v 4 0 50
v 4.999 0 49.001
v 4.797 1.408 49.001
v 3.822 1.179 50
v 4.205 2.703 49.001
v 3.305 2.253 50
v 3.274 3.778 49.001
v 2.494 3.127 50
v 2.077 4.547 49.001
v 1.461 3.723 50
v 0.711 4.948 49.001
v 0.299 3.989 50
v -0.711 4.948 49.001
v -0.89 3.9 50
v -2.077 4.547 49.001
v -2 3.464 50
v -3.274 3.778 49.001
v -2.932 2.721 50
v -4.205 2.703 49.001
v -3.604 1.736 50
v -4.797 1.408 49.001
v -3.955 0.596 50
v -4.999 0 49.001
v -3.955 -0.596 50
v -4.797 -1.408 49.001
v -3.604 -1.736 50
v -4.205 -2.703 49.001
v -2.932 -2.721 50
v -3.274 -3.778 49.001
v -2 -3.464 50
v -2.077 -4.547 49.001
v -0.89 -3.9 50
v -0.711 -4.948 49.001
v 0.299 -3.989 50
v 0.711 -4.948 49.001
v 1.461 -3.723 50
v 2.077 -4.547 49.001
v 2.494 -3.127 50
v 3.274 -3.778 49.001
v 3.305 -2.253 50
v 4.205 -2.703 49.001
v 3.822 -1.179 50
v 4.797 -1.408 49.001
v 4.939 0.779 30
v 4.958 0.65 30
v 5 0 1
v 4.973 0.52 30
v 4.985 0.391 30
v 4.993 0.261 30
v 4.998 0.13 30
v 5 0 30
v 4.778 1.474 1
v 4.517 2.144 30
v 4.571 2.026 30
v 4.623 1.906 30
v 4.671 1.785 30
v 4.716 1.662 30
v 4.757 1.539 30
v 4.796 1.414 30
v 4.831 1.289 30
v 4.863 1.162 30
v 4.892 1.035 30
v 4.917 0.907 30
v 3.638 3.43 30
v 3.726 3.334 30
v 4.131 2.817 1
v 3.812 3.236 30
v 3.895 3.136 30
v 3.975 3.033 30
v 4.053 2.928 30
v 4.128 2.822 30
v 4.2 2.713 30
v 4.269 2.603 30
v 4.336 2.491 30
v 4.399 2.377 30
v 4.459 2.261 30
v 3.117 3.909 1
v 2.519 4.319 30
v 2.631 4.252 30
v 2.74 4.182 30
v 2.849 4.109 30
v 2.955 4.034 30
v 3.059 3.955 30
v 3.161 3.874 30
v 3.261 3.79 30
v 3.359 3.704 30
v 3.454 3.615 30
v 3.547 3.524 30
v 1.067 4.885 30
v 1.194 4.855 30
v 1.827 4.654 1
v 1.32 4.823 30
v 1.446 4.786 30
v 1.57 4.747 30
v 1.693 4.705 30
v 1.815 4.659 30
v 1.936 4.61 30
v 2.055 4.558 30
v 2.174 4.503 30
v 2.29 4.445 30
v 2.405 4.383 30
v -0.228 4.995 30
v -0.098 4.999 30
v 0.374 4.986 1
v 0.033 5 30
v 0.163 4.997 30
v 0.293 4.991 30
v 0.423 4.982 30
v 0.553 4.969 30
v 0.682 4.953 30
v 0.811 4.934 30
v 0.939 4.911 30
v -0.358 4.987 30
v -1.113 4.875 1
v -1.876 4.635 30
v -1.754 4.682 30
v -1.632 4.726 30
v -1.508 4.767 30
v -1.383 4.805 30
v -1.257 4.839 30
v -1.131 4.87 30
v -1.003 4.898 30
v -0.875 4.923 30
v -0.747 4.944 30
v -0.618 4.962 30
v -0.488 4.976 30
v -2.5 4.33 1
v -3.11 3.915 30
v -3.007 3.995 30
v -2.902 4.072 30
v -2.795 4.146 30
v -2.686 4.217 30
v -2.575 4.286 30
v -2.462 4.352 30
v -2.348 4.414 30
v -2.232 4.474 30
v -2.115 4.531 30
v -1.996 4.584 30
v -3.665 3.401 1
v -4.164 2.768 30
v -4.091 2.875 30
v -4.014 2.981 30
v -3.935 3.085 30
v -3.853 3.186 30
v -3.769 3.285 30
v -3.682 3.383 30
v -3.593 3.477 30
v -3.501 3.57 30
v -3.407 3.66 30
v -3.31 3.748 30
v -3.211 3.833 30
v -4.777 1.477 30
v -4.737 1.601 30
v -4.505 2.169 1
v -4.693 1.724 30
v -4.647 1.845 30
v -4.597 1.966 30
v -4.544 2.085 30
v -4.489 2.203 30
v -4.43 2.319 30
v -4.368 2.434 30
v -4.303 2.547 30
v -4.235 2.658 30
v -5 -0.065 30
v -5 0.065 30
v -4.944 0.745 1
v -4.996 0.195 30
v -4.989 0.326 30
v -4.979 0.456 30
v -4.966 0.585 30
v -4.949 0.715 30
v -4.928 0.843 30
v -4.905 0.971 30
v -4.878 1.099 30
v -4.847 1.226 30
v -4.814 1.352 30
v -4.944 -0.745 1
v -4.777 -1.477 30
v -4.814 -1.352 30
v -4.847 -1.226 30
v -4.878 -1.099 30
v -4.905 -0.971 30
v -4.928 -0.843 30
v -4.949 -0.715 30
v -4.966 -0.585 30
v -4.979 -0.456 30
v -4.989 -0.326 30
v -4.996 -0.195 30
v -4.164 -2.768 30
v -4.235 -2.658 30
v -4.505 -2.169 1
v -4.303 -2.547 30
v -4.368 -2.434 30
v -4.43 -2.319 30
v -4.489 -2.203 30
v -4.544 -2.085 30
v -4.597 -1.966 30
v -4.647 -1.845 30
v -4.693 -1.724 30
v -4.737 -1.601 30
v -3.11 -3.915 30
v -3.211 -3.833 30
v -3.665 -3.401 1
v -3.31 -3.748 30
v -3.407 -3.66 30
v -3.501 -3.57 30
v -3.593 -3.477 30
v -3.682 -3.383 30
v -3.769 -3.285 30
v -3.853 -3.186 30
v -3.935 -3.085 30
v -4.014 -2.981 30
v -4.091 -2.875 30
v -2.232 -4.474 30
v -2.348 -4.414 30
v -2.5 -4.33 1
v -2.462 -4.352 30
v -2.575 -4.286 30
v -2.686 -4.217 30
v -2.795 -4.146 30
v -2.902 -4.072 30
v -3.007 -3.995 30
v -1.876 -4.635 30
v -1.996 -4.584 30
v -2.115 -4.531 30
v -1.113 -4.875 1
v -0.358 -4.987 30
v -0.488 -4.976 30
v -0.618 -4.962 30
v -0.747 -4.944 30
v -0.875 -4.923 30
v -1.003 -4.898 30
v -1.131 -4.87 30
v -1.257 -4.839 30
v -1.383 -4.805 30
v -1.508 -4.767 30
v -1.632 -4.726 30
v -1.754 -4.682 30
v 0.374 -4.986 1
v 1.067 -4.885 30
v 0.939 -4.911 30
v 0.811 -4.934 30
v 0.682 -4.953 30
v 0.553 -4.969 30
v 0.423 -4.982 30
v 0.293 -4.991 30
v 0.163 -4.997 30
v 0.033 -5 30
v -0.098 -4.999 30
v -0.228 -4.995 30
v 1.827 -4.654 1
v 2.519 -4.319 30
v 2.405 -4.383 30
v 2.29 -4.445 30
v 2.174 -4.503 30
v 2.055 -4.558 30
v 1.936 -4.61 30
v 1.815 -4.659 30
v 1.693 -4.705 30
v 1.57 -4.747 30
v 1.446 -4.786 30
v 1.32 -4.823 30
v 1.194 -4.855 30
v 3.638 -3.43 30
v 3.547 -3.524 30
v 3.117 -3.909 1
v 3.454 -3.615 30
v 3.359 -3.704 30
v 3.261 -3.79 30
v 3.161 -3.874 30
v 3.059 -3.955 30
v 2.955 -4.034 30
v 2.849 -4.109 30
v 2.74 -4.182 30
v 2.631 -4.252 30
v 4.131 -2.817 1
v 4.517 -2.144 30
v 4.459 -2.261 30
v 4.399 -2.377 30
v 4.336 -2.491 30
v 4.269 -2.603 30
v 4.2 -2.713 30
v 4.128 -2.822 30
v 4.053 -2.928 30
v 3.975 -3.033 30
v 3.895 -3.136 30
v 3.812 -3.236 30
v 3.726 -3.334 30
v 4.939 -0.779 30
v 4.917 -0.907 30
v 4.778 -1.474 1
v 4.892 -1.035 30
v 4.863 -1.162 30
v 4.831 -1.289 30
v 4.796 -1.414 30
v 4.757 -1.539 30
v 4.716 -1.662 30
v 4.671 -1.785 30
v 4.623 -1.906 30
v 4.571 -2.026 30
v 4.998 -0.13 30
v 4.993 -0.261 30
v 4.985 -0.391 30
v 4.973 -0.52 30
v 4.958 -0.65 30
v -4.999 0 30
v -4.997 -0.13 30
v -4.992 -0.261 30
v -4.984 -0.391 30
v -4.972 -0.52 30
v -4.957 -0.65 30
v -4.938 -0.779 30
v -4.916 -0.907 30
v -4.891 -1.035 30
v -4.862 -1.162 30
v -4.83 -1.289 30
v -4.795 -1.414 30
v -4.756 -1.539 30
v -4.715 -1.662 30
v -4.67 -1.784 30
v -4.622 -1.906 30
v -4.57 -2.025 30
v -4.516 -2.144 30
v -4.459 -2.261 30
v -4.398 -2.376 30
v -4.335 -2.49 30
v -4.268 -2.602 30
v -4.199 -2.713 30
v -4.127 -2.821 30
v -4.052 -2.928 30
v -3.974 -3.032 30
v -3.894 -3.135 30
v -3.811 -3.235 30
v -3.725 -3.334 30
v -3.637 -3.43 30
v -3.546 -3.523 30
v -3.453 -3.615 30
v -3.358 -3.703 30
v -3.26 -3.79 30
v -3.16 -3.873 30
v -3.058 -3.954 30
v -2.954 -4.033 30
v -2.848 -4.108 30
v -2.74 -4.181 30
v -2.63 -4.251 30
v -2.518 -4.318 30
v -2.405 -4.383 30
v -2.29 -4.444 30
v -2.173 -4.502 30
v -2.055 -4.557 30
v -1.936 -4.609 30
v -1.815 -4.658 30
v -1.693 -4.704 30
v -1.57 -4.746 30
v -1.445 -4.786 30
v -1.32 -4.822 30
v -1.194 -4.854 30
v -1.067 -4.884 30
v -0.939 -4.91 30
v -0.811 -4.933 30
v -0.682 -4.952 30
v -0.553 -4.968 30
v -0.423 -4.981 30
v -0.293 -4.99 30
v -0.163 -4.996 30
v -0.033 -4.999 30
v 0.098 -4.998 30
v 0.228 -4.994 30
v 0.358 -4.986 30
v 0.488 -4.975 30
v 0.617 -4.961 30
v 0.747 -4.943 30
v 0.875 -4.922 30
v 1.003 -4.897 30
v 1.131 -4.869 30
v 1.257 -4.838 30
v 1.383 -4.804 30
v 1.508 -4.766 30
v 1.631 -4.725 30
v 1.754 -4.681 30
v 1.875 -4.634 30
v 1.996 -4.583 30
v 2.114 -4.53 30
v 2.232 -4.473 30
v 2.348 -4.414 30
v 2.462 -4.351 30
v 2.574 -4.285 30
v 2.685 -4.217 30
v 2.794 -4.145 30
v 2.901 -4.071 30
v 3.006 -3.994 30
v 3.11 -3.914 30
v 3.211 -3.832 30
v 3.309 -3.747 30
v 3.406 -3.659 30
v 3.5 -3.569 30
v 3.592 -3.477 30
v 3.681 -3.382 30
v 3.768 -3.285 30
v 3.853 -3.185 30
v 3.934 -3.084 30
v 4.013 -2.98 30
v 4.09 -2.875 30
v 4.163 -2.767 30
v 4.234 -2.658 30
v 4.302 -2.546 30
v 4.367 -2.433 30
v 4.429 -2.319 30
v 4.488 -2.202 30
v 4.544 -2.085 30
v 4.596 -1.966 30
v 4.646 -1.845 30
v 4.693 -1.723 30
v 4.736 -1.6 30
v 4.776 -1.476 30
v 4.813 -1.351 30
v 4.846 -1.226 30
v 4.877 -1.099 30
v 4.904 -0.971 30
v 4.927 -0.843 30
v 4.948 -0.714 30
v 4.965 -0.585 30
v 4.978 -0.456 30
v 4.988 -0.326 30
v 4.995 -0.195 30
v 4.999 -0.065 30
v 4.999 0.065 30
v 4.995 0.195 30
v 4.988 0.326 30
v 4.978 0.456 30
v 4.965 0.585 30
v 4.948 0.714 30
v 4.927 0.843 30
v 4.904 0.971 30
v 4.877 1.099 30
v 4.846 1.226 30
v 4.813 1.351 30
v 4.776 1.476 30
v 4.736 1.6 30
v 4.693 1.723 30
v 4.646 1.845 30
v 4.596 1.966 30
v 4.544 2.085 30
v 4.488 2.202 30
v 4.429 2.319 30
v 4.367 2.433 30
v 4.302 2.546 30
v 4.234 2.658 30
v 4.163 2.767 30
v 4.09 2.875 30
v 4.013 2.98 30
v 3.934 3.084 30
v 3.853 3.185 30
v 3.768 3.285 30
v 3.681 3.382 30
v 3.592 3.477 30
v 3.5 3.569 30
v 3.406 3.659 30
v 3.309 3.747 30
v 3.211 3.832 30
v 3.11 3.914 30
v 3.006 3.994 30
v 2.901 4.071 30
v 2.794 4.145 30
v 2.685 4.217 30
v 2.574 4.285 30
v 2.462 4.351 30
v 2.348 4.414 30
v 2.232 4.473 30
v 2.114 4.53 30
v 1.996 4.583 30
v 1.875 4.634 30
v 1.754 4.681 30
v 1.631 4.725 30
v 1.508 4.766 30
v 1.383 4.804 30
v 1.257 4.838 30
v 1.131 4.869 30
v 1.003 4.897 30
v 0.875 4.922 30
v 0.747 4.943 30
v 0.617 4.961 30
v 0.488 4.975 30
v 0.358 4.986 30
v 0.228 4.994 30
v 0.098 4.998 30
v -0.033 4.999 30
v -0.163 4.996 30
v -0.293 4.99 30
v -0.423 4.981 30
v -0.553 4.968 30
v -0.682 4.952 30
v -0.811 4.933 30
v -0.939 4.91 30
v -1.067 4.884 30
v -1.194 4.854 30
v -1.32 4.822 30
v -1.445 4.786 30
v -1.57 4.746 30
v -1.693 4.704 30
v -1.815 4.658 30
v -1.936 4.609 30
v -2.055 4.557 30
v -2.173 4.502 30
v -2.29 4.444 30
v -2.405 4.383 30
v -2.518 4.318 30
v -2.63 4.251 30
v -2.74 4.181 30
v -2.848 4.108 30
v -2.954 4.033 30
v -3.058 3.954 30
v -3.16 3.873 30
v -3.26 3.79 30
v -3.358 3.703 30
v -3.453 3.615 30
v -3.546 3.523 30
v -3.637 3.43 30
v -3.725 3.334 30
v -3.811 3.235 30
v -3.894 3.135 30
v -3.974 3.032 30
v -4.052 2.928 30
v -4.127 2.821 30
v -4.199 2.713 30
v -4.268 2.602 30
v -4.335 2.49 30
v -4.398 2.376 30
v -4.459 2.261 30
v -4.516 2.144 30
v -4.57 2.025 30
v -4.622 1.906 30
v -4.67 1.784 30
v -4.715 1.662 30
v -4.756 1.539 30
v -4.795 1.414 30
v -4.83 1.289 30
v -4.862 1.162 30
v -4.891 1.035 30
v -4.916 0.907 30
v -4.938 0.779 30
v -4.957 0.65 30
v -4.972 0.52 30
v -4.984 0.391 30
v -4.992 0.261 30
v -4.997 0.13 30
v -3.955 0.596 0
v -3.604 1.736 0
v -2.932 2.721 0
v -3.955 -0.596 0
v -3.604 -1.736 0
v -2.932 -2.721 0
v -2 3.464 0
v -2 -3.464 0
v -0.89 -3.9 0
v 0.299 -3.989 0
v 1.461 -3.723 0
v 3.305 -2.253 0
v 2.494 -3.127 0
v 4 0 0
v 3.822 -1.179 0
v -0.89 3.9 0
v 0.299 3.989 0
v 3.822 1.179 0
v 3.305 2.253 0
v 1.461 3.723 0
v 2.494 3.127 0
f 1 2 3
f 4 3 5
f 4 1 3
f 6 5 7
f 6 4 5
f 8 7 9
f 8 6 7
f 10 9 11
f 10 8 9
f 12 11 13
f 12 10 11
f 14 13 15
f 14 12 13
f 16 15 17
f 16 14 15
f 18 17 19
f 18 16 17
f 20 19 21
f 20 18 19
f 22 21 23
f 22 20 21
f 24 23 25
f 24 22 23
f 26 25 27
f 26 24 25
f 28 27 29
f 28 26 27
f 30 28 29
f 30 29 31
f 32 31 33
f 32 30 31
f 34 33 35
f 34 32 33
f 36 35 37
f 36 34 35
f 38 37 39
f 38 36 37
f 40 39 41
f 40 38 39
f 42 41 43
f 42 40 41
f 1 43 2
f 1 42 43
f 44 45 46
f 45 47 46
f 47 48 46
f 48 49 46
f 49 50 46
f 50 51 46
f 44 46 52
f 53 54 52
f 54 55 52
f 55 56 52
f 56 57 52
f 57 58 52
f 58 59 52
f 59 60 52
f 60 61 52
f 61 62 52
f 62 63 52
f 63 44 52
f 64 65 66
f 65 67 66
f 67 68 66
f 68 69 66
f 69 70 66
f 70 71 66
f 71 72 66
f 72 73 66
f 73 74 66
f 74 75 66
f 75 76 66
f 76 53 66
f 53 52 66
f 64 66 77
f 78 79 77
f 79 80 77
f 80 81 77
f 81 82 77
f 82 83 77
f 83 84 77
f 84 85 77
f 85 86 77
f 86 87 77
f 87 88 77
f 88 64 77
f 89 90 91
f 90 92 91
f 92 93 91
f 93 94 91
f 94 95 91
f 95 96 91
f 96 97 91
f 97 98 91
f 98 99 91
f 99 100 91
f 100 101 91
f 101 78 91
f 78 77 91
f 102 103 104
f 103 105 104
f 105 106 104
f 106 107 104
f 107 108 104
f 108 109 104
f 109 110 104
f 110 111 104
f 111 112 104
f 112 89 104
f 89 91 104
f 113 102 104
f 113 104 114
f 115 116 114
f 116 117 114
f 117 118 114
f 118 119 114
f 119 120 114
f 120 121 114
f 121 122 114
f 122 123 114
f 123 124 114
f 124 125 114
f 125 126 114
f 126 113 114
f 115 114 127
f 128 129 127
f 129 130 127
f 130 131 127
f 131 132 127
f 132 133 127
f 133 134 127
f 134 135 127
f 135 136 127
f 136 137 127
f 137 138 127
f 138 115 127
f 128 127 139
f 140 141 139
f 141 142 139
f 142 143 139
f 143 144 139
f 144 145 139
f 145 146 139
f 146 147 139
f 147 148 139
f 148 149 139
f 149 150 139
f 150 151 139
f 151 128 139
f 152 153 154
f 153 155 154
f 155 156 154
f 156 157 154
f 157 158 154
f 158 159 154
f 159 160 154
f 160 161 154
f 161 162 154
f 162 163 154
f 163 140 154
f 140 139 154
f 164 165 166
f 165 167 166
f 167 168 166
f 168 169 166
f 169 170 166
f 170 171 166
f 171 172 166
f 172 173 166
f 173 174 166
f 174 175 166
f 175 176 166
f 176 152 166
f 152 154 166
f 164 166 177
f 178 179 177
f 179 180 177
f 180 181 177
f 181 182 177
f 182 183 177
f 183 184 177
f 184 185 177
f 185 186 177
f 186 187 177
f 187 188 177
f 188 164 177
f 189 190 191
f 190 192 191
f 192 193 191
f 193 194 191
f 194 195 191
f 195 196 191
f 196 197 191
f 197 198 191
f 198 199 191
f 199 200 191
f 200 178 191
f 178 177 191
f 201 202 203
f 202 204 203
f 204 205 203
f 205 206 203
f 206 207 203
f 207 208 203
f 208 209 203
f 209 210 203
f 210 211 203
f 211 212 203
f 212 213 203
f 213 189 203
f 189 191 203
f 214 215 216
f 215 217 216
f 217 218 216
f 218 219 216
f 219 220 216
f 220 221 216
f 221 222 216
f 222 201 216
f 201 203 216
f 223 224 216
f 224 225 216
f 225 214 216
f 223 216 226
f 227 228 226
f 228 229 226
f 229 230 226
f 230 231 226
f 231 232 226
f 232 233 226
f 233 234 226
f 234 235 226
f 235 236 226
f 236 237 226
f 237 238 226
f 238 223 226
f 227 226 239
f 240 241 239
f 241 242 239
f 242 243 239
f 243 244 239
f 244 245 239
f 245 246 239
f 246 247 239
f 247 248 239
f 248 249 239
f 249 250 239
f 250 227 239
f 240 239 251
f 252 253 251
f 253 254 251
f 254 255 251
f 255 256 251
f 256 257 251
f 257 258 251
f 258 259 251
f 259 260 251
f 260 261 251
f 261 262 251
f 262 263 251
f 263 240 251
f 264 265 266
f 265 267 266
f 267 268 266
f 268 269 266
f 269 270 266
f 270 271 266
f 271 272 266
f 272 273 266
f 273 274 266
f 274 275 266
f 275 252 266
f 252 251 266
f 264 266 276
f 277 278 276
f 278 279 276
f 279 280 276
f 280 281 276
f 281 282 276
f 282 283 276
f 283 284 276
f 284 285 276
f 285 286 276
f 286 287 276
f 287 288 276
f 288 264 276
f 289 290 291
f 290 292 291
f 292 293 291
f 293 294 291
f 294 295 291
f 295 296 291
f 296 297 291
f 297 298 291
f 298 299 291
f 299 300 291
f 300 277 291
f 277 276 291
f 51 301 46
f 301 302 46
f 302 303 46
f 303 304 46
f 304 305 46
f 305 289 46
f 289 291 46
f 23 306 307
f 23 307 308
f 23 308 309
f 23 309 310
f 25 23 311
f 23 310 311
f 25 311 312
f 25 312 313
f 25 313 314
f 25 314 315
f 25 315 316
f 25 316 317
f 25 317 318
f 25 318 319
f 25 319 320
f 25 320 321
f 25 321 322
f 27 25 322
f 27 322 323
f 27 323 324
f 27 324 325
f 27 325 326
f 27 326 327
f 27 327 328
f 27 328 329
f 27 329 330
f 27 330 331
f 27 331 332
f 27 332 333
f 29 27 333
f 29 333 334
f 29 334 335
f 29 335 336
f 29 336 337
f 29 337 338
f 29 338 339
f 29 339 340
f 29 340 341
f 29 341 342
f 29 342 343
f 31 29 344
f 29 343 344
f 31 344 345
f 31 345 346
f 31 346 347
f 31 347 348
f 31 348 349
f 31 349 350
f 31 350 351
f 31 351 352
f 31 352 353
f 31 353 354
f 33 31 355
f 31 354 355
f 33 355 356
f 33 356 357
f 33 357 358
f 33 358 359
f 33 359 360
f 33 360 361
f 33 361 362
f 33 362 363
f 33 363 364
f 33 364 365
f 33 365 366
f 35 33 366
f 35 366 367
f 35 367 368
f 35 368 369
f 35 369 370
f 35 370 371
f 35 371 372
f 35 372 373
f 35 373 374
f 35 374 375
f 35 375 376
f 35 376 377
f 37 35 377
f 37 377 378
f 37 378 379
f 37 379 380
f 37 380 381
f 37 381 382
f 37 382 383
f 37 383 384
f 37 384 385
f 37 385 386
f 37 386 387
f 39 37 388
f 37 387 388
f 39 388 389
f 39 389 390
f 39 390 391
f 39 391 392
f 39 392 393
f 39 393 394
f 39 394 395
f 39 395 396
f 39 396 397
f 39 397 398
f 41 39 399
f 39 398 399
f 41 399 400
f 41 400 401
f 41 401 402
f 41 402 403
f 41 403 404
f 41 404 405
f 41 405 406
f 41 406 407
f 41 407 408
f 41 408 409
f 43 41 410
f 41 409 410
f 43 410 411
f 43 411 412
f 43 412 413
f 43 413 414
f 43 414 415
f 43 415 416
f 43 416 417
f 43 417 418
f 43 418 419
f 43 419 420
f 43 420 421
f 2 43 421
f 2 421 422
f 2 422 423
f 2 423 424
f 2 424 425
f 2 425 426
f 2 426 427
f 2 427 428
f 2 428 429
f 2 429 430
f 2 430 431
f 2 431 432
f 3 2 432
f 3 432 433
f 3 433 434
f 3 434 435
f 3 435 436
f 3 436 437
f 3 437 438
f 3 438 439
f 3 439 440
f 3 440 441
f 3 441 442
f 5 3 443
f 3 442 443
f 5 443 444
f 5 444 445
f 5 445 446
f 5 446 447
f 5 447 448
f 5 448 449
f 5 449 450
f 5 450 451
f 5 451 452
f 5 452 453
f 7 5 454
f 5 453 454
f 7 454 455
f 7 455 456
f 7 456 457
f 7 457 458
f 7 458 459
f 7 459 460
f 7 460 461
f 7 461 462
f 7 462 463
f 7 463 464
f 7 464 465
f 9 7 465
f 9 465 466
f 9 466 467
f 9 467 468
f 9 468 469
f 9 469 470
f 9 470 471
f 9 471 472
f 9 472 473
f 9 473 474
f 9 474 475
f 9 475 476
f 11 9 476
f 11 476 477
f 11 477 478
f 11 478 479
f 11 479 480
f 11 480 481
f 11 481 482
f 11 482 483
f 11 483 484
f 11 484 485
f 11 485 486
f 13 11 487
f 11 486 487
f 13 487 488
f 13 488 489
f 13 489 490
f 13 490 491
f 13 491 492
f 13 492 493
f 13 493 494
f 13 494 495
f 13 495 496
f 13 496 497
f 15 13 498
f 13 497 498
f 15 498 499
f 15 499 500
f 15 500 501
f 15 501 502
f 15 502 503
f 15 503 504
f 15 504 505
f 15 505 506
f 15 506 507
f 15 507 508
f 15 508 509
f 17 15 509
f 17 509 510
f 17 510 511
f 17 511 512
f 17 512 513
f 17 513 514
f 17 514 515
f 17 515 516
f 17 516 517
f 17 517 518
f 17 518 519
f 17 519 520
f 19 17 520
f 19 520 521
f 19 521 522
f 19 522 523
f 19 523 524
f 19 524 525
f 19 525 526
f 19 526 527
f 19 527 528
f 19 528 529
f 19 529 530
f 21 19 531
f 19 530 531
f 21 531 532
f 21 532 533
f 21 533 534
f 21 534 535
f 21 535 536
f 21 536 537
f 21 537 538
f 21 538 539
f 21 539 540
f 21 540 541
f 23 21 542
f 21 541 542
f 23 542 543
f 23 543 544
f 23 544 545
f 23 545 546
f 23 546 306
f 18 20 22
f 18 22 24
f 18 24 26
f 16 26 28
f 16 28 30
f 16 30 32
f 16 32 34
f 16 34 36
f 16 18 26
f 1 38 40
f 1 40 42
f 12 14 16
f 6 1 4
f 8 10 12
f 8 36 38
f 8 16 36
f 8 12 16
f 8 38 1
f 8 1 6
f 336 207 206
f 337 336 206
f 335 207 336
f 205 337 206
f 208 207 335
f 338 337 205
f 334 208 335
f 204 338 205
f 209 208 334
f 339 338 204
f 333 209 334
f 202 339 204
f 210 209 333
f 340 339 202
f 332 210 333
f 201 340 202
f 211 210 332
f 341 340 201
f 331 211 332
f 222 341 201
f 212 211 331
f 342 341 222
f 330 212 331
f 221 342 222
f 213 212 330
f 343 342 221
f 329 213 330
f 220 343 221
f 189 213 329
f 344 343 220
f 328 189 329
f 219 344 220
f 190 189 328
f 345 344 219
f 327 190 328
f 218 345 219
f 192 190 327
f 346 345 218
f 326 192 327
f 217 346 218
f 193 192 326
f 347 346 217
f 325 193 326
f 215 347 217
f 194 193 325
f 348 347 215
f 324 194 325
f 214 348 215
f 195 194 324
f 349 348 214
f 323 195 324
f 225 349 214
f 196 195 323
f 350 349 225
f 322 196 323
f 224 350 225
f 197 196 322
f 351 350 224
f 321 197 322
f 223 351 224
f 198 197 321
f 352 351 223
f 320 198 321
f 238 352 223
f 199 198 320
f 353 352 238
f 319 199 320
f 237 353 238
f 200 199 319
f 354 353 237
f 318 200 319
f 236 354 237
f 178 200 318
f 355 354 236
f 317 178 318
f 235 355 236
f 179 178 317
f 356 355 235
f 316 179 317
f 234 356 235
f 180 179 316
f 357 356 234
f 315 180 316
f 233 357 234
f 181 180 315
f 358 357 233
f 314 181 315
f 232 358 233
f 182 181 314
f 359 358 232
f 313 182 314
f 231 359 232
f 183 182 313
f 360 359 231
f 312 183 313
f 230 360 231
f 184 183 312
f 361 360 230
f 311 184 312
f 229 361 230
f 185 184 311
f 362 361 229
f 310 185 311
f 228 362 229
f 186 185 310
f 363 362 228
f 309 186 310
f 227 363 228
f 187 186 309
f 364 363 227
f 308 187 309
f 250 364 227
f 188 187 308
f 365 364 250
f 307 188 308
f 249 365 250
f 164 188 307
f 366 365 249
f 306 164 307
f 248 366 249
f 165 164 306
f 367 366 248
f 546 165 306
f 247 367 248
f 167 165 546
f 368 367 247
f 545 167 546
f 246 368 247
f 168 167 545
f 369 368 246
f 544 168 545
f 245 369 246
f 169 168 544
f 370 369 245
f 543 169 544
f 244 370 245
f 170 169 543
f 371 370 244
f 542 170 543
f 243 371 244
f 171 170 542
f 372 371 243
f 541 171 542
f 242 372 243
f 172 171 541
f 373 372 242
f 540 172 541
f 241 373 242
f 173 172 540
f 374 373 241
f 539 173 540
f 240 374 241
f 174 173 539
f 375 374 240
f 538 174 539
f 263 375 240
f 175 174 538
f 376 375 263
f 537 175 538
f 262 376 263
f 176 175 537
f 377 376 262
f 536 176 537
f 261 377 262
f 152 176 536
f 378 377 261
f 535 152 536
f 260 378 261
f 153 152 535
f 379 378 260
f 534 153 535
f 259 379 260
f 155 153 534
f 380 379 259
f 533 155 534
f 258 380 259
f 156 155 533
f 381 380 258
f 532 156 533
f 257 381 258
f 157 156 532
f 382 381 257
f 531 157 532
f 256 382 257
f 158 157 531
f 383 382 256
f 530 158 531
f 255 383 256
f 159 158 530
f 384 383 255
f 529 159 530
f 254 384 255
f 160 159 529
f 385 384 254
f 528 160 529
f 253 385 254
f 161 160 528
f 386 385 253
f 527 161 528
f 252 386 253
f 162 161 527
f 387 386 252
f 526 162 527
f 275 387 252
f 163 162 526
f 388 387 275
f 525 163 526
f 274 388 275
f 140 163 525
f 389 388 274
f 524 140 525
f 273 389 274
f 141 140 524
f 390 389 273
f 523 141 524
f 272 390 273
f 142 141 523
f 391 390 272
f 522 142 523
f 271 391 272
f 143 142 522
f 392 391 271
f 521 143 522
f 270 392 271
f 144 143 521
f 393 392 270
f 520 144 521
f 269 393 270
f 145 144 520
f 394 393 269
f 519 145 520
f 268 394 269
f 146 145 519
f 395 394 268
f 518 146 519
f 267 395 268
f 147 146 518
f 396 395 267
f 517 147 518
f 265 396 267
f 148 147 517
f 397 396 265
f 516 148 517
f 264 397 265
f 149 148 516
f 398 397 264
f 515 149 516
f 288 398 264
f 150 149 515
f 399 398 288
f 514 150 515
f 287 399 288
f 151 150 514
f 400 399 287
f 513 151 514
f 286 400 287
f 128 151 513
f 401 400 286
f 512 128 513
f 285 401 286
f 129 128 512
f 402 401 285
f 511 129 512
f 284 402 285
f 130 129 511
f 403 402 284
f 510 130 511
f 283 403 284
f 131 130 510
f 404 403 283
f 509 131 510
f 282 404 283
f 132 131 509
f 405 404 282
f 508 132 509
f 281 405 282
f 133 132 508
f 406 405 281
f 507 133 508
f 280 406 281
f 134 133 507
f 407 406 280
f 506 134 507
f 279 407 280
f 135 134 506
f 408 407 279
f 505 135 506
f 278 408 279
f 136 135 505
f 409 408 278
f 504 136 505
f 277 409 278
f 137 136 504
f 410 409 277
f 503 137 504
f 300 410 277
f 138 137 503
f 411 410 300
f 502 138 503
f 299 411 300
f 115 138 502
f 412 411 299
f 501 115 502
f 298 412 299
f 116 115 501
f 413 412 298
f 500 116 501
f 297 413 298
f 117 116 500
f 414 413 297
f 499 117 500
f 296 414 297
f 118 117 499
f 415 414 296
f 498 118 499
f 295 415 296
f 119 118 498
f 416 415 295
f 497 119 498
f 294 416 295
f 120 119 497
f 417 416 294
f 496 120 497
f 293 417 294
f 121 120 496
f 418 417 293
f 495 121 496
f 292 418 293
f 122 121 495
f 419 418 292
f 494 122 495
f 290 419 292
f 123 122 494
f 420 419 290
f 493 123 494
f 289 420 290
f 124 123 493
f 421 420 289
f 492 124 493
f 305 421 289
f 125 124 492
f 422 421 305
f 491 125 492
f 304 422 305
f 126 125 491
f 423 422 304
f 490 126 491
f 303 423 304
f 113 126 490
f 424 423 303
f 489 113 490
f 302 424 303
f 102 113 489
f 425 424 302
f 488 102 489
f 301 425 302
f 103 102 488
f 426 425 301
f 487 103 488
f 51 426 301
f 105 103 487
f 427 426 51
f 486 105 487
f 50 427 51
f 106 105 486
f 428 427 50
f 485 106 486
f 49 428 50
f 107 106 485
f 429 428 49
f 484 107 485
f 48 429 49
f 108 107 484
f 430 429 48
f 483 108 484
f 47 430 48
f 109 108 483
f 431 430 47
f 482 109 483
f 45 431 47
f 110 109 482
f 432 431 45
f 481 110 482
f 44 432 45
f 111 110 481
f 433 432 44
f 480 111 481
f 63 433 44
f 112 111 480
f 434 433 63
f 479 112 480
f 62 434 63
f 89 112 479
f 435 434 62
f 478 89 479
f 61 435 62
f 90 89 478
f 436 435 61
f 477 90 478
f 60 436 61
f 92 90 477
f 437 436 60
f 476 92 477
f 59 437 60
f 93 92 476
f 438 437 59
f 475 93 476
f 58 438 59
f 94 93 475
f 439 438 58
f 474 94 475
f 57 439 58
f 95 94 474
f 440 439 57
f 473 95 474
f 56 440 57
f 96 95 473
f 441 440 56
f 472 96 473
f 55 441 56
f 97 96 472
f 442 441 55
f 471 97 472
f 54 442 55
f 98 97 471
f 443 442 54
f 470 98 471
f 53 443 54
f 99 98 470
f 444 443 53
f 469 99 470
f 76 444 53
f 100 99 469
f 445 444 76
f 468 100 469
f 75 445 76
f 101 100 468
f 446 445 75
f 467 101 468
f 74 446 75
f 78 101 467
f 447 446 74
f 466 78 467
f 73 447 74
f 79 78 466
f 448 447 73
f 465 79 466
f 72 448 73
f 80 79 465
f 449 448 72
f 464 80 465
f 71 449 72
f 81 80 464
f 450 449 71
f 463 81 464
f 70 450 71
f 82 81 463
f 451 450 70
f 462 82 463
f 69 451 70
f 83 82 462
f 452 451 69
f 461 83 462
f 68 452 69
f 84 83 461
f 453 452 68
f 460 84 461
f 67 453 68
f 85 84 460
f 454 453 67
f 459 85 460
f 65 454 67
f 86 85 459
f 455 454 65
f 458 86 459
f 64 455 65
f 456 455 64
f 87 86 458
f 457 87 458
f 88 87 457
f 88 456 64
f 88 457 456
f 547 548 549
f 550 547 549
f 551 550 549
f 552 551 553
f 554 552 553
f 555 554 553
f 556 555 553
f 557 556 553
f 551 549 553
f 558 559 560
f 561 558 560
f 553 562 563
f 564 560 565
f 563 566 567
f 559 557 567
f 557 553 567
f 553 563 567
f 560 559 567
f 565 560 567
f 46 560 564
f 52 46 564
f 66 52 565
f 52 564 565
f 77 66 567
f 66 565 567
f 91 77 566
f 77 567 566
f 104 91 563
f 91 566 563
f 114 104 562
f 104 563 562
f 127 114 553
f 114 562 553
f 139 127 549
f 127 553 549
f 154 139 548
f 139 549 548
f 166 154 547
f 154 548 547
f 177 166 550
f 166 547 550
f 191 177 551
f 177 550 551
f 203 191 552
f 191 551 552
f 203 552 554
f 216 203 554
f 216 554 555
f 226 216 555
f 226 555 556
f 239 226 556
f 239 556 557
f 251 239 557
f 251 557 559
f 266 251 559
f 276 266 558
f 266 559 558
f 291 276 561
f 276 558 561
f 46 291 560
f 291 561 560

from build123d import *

# Parameters (mm, degrees)
SKIZZE1_R                       = 5
AUFSATZ_LINEAR_AUSTRAGEN1_DEPTH = 50
FASE1_SIZE                      = 1
SZKIC1_OUTSIDE_W                = 22.392
SZKIC1_OUTSIDE_H                = 22.392
SZKIC1_OUTSIDE_R                = 4.999
WYTNIJ_WYCI_GNI_CIE1_DEPTH      = 21


with BuildPart() as part:
    # Skizze1 → Aufsatz-Linear austragen1 (new body)
    with BuildSketch(Plane.XY):
        Circle(SKIZZE1_R)
    extrude(amount=AUFSATZ_LINEAR_AUSTRAGEN1_DEPTH)

    # Fase1
    fase1_edges = [part.edges().sort_by_distance(p)[0] for p in [
        (-5, 0, 0),
        (-5, 0, 50),
    ]]
    chamfer(fase1_edges, length=FASE1_SIZE)

    # Szkic1 outside → Wytnij-wyciągnięcie1 (cut, through all)
    with BuildSketch(Plane.XY.offset(30)):
        Rectangle(SZKIC1_OUTSIDE_W, SZKIC1_OUTSIDE_H)
        with Locations(Location((0, 0, 0), (0, 0, 180))):  # turned: the seam where the file's is
            Circle(SZKIC1_OUTSIDE_R, mode=Mode.SUBTRACT)
    extrude(amount=WYTNIJ_WYCI_GNI_CIE1_DEPTH, mode=Mode.SUBTRACT)


solid = part.part
